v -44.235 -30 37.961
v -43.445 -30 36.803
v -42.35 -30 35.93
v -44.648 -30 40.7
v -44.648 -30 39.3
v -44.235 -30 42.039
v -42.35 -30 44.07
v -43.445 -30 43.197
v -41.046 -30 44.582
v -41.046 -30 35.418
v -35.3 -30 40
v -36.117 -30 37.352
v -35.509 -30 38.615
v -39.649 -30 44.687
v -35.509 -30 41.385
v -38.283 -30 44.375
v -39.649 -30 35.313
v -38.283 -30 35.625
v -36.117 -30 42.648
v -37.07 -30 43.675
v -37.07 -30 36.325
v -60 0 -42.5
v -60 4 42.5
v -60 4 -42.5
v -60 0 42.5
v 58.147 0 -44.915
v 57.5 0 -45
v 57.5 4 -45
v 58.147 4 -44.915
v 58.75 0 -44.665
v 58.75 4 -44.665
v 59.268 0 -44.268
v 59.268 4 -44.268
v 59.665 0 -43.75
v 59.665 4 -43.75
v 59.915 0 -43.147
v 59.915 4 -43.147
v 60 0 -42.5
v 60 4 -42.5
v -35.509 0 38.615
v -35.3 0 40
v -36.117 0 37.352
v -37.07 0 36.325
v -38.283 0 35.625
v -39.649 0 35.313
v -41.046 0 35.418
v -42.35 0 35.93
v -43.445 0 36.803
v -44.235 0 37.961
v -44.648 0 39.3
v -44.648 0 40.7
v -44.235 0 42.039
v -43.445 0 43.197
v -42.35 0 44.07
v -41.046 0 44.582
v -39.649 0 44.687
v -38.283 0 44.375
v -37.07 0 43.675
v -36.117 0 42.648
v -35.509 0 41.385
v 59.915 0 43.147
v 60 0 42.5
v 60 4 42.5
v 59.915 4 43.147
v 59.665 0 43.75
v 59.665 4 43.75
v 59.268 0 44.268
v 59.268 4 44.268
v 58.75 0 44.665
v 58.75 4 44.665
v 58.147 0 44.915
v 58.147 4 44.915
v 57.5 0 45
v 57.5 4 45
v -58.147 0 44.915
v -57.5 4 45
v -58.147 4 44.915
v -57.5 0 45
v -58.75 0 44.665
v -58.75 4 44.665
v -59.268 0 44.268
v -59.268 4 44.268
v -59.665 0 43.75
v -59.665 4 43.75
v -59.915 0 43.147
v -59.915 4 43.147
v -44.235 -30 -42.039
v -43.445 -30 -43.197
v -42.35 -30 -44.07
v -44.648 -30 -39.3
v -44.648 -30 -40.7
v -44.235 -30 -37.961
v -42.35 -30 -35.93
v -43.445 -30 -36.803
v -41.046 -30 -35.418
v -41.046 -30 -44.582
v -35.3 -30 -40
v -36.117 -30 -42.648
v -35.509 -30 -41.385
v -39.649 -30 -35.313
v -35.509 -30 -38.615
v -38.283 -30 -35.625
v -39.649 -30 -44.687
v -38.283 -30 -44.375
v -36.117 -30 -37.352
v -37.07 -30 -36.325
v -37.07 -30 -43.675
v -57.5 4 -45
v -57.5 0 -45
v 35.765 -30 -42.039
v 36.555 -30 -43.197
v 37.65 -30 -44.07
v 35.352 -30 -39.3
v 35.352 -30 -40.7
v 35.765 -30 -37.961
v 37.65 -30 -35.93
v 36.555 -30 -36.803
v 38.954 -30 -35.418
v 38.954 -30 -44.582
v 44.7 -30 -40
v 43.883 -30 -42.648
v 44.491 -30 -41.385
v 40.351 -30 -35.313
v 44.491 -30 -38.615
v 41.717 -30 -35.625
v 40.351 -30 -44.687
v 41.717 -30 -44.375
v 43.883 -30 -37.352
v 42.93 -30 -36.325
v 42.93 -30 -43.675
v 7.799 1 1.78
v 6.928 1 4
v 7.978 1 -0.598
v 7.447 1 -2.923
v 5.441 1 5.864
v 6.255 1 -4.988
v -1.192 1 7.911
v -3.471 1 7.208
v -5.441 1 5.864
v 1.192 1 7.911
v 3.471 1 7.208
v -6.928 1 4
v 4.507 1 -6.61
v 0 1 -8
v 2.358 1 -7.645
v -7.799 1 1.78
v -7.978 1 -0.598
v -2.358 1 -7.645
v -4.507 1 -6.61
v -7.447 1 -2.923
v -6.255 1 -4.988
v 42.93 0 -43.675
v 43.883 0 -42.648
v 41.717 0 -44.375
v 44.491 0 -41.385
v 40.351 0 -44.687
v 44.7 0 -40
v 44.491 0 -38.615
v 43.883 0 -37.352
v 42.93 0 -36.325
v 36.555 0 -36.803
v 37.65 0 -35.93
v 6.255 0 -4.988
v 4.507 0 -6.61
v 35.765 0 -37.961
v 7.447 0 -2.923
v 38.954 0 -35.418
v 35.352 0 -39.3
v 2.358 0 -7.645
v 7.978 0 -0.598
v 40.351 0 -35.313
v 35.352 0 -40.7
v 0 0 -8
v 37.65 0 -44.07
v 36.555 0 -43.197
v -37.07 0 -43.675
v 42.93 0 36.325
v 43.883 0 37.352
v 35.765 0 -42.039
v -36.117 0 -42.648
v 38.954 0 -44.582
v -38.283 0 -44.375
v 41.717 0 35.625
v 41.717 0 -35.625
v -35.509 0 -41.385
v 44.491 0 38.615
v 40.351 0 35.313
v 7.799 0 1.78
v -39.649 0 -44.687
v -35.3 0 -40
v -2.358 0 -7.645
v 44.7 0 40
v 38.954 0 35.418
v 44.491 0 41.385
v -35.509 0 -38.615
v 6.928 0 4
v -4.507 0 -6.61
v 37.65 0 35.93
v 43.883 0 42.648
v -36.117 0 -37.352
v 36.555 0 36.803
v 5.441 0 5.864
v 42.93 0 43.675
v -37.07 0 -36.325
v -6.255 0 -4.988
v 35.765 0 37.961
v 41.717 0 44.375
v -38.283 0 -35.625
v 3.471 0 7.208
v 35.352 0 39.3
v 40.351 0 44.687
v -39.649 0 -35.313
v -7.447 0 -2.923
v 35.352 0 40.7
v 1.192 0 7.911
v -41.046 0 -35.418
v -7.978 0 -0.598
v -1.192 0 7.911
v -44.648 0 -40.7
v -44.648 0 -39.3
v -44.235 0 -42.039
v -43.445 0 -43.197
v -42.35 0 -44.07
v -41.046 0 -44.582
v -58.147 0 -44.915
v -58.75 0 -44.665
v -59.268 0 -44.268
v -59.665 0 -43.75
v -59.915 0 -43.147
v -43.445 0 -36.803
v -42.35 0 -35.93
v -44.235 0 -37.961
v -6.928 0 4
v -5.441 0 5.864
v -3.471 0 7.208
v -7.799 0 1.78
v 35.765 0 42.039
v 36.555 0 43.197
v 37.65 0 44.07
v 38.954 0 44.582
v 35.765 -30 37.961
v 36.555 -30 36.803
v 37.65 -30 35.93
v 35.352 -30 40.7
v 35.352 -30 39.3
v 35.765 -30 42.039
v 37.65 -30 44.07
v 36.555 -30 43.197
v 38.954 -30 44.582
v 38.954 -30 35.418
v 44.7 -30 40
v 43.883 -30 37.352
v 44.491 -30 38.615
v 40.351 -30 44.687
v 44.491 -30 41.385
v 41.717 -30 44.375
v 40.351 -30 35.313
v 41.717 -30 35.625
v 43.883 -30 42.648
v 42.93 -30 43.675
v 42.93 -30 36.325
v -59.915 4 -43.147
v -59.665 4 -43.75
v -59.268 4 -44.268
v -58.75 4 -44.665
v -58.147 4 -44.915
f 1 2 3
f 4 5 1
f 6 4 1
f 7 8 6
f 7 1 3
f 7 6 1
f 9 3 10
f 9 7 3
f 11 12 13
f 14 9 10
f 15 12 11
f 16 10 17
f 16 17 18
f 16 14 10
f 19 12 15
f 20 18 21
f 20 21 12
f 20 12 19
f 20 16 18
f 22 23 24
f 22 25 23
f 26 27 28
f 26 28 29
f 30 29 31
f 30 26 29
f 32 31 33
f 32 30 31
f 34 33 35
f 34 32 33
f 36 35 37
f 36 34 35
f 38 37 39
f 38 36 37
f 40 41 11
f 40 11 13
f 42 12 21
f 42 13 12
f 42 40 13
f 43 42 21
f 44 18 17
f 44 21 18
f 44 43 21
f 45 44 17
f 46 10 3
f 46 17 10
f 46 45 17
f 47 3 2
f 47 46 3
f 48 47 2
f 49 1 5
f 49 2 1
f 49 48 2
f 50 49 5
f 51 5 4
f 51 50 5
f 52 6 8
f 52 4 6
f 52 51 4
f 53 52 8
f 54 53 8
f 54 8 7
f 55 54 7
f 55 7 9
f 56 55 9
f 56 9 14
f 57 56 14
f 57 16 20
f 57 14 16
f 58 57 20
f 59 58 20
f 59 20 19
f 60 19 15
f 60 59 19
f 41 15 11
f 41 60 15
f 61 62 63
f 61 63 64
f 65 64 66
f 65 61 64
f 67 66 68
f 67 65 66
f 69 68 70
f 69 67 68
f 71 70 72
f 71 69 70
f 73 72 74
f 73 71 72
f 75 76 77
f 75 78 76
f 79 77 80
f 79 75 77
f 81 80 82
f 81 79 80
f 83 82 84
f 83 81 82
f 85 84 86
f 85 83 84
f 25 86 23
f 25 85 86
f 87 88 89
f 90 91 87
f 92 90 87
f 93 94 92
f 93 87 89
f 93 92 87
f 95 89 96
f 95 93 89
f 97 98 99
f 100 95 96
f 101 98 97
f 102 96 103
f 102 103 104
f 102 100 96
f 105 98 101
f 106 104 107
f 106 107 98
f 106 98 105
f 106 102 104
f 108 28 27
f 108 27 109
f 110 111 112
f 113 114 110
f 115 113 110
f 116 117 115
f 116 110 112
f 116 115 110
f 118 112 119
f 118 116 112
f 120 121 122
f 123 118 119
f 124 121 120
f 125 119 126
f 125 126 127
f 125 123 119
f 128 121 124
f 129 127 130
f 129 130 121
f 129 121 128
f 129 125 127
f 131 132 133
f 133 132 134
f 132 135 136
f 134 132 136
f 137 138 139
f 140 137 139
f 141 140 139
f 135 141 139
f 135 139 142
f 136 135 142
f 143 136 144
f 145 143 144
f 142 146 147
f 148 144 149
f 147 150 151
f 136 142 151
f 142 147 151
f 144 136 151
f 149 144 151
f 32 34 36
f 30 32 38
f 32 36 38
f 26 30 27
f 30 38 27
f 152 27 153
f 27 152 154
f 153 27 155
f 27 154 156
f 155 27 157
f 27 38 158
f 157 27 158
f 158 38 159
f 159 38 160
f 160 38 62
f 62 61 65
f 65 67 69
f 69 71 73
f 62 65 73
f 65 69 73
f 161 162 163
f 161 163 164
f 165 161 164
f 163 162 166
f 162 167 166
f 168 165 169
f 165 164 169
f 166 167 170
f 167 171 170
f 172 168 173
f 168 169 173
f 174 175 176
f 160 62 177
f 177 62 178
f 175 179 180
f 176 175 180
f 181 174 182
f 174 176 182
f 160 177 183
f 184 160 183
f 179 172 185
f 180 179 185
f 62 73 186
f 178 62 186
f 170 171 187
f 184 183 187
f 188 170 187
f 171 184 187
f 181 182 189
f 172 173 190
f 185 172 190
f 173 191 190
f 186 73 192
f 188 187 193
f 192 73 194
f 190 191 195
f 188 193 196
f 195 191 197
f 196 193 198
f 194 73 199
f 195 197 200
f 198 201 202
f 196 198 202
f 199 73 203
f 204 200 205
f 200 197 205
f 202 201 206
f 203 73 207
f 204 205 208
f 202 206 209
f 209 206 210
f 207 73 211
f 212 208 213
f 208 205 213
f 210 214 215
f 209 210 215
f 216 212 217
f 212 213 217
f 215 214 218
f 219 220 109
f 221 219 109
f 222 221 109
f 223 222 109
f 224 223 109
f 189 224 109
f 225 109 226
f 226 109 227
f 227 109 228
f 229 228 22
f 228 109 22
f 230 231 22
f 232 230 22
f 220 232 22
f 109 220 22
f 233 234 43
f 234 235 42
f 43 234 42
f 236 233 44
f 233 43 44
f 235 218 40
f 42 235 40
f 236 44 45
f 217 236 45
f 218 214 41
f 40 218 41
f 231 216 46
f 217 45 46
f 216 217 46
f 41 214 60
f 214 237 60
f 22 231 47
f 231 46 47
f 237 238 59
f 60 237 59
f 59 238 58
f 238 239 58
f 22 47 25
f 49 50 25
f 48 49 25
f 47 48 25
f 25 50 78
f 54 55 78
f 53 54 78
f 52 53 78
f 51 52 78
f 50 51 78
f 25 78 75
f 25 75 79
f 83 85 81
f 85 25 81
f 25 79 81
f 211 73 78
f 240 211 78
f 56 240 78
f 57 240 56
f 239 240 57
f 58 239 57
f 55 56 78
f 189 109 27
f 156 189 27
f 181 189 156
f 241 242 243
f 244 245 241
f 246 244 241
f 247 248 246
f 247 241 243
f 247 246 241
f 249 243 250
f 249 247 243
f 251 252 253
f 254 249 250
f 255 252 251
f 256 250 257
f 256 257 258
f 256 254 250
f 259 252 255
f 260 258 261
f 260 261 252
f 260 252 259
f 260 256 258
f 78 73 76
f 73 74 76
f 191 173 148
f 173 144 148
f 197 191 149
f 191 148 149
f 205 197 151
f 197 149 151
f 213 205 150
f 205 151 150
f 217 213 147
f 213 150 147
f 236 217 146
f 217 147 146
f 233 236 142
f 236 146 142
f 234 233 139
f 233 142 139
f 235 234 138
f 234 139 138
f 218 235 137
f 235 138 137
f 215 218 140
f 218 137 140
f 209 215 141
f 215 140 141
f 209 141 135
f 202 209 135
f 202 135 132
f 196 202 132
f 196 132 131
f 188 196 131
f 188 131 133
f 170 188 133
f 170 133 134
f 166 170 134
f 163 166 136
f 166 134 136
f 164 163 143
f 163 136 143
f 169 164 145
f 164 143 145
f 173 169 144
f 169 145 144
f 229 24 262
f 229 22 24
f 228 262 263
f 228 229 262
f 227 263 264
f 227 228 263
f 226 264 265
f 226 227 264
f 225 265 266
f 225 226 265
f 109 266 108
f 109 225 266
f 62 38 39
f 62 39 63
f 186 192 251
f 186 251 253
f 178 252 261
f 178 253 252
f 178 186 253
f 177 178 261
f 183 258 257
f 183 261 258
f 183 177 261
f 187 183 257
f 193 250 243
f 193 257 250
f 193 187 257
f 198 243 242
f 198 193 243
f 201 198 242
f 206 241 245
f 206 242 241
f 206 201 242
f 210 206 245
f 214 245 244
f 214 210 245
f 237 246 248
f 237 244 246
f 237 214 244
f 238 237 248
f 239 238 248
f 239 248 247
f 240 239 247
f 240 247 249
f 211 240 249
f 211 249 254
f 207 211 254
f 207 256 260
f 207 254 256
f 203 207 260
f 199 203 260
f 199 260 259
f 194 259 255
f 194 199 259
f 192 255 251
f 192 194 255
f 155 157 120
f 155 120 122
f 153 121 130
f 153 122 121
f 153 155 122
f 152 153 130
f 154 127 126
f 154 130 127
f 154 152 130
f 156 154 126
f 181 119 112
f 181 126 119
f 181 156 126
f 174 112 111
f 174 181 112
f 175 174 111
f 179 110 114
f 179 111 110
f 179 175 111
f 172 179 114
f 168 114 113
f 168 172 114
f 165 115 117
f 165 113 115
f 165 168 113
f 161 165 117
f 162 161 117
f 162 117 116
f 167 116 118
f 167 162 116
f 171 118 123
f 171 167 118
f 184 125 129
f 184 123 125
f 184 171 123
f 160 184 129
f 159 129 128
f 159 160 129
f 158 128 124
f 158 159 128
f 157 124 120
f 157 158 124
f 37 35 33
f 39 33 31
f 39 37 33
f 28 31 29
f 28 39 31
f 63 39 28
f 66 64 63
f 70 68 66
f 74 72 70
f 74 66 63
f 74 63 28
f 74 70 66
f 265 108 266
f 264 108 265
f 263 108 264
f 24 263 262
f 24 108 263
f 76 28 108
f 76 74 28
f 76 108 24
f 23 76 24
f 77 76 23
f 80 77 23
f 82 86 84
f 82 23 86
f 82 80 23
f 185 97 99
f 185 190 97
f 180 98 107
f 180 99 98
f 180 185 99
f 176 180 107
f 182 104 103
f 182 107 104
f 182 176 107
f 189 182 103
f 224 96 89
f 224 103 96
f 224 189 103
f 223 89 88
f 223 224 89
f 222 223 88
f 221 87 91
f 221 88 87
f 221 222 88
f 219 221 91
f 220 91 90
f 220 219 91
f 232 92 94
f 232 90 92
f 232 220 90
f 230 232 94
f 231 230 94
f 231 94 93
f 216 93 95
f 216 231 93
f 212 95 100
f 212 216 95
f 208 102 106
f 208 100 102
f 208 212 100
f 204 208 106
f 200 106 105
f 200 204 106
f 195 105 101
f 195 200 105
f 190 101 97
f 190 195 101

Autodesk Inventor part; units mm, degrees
ref_plane "YZ Plane" through (0, 0, 0) normal (1, 0, 0) x (0, 1, 0)
ref_plane "XZ Plane" through (0, 0, 0) normal (0, 1, 0) x (-1, 0, 0)
ref_plane "XY Plane" through (0, 0, 0) normal (0, 0, 1) x (1, 0, 0)
sketch "Sketch2" plane through (0, 0, 0) normal (0, 1, 0) x (-1, 0, 0)
  line L0 (-60, 60) -> (60, 60)
  line L1 (60, 60) -> (60, -60)
  line L2 (60, -60) -> (-60, -60)
  line L3 (-60, -60) -> (-60, 60)
  line L4 (-60, 60) -> (60, -60) construction
  line L5 (60, 60) -> (-60, -60) construction
  point P0 (0, 0)
  dimension "d4" = 120
  dimension "d5" = 120
extrude "Extrusion2" add sketch "Sketch2" along normal blind 4
sketch "Sketch3" plane through (0, 0, 0) normal (0, -1, 0) x (1, 0, 0)
  line L0 (-40, 40) -> (40, 40) construction
  line L1 (40, 40) -> (40, -40) construction
  line L2 (40, -40) -> (-40, -40) construction
  line L3 (-40, -40) -> (-40, 40) construction
  line L4 (-40, 40) -> (40, -40) construction
  line L5 (40, 40) -> (-40, -40) construction
  circle A0 centre (40, 40) radius 4.7
  circle A1 centre (-40, 40) radius 4.7
  circle A2 centre (-40, -40) radius 4.7
  circle A3 centre (40, -40) radius 4.7
  point P0 (0, 0)
  dimension "d8" = 80
  dimension "d9" = 80
  dimension "d10" = 9.4
  dimension "d13" = 360
extrude "Extrusion3" add sketch "Sketch3" along normal blind 30
sketch "Sketch4" plane through (0, 0, 0) normal (0, -1, 0) x (1, 0, 0)
  point P0 (0, 0)
  point P1 (0, 0)
hole "Hole1" at (0, 0, 0) direction (0, 1, 0) diameter 16 depth 1
sketch "Sketch5" plane through (0, 4, 0) normal (0, 1, 0) x (1, 0, 0)
  line L0 (60, -60) -> (60, 60) projected
  line L1 (-60, -60) -> (60, -60)
  line L2 (60, -60) -> (60, -45)
  line L3 (60, -45) -> (-60, -45)
  line L4 (-60, -45) -> (-60, -60)
  line L5 (60, 60) -> (-60, 60) projected
  line L6 (-60, 60) -> (60, 60)
  line L7 (60, 60) -> (60, 45)
  line L8 (60, 45) -> (-60, 45)
  line L9 (-60, 45) -> (-60, 60)
  point P0 (0, 0)
  dimension "d24" = 15
  dimension "d25" = 15
extrude "Extrusion4" cut sketch "Sketch5" against normal up to surface (4 mm away)
fillet "Fillet2" radius 2.5 4 edges at (60, 2, 45) (60, 2, -45) (-60, 2, 45) (-60, 2, -45)
properties part number "sliding_surface_3DPrint"
